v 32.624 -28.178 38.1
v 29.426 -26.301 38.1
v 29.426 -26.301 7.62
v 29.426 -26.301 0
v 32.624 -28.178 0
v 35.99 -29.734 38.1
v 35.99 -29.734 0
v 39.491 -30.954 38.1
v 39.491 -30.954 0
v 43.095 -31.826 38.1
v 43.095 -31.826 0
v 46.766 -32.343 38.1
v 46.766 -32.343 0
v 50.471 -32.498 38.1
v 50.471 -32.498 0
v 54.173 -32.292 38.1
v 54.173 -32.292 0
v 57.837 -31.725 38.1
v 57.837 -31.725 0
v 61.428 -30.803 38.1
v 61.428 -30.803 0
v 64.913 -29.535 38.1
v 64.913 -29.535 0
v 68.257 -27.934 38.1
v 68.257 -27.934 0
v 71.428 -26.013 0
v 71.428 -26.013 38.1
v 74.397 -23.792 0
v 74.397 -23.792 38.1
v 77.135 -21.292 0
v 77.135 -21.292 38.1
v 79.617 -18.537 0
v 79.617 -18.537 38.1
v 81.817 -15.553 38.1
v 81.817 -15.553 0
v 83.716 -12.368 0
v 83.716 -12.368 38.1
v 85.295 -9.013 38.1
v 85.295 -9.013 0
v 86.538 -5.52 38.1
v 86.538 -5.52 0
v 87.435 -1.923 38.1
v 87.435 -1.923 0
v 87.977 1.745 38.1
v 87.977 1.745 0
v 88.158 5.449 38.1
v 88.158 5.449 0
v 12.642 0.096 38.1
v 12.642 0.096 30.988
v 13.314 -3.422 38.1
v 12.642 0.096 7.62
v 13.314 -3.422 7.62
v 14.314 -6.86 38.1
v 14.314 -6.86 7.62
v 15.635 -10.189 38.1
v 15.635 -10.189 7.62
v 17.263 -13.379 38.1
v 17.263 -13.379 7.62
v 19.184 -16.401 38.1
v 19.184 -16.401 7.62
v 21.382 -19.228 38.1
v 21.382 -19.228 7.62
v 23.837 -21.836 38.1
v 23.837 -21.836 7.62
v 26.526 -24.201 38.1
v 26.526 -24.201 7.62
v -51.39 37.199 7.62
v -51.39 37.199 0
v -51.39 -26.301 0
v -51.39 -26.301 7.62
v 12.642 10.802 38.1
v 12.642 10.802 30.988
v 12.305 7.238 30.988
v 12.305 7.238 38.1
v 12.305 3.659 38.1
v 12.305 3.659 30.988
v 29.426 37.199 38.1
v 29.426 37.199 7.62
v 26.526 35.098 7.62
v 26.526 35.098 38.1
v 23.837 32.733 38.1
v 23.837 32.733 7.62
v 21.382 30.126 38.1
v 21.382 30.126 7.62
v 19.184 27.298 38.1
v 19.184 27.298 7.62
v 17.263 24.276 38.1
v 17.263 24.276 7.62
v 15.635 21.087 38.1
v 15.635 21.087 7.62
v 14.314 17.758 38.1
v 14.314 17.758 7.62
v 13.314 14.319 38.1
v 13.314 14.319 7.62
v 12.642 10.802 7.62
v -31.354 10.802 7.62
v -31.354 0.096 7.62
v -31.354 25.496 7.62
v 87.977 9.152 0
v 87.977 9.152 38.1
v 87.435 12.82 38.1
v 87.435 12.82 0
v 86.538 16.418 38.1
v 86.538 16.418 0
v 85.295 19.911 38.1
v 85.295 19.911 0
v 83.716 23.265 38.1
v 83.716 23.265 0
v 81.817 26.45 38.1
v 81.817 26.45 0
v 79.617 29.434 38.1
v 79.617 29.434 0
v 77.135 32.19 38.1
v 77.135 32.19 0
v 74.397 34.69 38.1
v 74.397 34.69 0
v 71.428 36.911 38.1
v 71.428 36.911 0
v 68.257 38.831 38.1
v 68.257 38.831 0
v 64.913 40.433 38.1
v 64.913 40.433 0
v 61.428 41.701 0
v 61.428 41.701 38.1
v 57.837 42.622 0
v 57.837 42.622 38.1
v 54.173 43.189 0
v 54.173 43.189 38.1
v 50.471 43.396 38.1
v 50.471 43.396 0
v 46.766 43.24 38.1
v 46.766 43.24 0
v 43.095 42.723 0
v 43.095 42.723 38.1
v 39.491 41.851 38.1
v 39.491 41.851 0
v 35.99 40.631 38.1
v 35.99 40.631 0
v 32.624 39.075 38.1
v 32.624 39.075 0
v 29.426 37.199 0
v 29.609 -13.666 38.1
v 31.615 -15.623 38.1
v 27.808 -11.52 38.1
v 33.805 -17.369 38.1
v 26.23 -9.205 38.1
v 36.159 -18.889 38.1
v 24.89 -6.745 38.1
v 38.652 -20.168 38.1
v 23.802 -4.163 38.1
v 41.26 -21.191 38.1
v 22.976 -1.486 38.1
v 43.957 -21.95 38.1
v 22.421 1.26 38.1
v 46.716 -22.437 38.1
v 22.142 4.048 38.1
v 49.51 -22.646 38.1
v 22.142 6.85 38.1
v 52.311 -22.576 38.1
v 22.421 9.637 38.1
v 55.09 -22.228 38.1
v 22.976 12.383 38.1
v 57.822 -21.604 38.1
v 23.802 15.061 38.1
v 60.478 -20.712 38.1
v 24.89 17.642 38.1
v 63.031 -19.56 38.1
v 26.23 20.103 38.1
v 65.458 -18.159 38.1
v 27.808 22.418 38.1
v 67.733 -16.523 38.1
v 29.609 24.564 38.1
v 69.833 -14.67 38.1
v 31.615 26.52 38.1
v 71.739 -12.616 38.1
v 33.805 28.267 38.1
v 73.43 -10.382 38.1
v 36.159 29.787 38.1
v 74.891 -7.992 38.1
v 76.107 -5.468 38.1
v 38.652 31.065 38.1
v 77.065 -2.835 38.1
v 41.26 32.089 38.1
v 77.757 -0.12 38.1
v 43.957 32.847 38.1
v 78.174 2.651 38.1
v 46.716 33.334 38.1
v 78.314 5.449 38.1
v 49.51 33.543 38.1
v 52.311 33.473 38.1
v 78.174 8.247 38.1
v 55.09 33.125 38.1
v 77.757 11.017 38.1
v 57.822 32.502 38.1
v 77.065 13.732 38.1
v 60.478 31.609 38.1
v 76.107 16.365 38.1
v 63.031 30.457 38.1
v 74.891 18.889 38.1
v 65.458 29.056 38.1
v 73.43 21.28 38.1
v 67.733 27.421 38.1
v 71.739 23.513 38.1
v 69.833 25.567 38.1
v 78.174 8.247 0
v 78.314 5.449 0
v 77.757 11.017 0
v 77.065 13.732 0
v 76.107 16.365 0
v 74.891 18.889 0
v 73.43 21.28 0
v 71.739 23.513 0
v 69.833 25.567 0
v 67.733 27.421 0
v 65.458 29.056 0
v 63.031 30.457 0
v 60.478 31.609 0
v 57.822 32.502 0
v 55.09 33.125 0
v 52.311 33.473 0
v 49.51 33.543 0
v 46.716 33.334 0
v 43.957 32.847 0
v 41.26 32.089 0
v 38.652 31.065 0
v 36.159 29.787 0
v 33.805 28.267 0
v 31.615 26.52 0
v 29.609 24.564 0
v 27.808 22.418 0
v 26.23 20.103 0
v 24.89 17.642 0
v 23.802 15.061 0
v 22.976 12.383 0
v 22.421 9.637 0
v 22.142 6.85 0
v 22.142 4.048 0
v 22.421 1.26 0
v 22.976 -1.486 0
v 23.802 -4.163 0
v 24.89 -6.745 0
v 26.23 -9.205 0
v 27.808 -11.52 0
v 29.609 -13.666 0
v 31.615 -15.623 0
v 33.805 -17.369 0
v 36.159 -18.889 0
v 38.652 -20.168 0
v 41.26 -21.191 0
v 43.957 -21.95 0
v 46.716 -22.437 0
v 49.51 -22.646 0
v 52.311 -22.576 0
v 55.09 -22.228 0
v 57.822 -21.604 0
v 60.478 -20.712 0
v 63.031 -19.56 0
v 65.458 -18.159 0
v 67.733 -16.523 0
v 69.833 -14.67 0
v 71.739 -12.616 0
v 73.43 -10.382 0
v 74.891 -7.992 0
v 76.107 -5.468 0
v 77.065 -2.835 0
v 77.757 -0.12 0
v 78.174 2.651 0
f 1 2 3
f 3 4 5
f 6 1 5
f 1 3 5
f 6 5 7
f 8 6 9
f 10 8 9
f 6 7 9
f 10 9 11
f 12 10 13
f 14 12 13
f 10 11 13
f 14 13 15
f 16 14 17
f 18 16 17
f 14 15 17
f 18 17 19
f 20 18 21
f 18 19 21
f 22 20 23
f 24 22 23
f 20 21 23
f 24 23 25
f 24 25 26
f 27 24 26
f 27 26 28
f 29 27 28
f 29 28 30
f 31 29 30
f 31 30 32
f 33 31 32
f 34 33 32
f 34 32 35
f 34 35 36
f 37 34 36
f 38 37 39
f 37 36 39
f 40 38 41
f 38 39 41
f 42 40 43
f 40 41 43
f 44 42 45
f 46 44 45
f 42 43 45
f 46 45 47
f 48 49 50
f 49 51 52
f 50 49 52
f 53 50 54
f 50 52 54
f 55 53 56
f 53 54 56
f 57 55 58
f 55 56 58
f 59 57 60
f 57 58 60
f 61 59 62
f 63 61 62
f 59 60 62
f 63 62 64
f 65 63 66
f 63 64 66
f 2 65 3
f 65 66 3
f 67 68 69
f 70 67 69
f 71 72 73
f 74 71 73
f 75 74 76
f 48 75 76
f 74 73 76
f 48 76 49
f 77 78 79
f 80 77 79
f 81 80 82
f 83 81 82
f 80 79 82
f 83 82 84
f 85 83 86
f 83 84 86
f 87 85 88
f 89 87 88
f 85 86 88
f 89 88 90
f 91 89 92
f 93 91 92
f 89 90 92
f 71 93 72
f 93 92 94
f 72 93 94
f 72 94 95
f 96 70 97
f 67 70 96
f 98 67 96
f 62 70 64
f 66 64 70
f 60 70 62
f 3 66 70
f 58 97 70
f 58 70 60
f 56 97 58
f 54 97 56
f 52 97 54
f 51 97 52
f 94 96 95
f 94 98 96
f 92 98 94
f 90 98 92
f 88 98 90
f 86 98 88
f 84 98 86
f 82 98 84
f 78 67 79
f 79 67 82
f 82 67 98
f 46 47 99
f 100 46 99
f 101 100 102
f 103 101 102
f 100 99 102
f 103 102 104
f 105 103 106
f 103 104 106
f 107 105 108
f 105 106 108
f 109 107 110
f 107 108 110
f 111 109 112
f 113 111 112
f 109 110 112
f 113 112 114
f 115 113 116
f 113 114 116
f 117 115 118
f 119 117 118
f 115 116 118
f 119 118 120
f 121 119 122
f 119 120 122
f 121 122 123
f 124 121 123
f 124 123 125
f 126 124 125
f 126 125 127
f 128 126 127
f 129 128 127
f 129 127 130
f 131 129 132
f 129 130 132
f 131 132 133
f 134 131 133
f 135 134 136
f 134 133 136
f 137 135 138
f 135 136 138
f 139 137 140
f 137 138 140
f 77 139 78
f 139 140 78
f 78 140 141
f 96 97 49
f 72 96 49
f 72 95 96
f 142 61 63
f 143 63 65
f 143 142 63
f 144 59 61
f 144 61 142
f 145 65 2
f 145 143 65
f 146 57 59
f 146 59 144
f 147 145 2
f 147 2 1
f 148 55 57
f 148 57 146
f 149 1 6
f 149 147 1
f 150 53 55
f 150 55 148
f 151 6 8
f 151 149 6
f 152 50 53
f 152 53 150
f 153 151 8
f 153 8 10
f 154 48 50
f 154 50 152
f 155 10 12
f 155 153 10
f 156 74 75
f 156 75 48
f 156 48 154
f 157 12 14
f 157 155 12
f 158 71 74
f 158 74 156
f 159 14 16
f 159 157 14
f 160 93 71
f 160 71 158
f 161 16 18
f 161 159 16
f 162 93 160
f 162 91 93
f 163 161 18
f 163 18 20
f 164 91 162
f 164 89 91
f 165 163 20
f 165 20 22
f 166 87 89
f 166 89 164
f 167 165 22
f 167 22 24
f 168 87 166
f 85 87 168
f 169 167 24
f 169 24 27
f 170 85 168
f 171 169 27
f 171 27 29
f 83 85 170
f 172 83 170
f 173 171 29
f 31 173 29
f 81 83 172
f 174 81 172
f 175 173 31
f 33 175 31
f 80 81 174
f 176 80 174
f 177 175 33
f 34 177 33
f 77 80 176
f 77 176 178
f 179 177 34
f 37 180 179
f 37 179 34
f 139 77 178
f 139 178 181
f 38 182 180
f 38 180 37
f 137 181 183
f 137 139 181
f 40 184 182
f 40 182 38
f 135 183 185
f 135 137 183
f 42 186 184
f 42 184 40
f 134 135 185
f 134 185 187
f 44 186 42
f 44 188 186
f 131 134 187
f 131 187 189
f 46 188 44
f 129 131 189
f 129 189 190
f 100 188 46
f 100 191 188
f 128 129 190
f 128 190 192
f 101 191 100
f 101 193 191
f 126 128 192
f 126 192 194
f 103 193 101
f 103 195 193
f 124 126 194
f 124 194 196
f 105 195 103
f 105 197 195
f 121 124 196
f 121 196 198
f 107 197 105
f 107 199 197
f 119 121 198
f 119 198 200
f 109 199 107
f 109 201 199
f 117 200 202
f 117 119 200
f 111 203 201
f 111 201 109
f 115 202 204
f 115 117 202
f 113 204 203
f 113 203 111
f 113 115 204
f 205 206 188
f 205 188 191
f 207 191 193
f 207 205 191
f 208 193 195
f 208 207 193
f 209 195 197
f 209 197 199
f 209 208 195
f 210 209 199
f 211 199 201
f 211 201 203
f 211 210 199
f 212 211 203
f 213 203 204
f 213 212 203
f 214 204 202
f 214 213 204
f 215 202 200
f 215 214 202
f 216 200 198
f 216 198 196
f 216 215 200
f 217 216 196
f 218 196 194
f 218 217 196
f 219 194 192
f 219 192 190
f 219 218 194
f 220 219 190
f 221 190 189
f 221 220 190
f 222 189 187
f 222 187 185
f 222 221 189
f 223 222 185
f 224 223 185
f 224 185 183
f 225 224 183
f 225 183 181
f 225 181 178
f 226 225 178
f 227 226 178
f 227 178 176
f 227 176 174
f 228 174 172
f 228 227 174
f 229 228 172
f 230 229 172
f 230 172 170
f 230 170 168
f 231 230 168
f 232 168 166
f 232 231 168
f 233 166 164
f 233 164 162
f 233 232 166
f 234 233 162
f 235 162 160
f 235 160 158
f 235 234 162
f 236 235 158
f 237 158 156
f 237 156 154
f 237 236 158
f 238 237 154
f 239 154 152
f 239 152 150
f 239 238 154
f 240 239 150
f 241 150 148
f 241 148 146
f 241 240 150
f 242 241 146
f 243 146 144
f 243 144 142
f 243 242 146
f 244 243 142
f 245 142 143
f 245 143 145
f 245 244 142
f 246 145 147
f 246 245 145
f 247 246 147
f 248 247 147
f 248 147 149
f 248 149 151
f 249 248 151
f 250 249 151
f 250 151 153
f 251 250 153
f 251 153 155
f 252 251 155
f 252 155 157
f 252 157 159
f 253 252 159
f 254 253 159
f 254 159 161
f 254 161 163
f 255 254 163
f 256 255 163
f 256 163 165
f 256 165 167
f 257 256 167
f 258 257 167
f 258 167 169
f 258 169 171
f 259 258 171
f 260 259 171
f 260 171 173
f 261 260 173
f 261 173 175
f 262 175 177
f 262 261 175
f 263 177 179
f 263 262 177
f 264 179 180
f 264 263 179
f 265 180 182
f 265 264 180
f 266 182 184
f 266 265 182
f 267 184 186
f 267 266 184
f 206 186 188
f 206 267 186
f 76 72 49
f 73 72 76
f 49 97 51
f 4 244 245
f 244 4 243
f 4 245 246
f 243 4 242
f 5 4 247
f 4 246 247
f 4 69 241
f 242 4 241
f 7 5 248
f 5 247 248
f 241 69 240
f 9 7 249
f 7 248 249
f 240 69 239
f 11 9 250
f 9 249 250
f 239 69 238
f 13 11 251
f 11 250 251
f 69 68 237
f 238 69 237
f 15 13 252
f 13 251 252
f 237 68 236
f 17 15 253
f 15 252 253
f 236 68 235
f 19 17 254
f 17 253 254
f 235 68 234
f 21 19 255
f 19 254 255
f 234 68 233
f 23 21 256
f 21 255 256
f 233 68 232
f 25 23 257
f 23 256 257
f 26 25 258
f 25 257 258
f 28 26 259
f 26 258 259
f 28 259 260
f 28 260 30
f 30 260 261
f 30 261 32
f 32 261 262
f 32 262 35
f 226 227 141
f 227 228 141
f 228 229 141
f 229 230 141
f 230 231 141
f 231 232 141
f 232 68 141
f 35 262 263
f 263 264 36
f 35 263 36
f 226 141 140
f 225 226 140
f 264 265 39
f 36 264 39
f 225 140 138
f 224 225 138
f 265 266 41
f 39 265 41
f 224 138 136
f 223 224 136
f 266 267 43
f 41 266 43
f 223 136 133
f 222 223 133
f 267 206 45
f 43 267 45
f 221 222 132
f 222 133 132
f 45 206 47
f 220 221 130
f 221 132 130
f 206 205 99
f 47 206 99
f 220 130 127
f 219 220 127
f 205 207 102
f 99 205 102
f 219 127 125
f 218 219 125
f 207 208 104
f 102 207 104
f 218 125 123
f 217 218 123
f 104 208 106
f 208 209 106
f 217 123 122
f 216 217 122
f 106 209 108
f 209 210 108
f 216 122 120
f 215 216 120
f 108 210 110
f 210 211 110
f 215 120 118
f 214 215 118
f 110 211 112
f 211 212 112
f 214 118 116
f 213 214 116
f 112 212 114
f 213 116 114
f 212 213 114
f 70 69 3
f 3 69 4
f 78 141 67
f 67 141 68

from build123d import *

# Parameters (mm, degrees)
F0_R     = 28.103341
F1_DEPTH = 38.1
F2_DEPTH = 7.62
F3_DEPTH = 30.988
F5_DEPTH = 25.4


with BuildPart() as f1:
    # F0 (on Top) → F1 (new body)
    with BuildSketch(Plane.XY):
        with BuildLine():
            ThreePointArc((88.158266, 5.448709), (68.256571, 38.830986), (29.426306, 37.198709))
            ThreePointArc((29.426306, 37.198709), (18.187712, 25.81016), (12.641991, 10.801828))
            ThreePointArc((12.641991, 10.801828), (12.262525, 5.448709), (12.641991, 0.09559))
            ThreePointArc((12.641991, 0.09559), (18.187712, -14.912741), (29.426306, -26.301291))
            ThreePointArc((29.426306, -26.301291), (68.256571, -27.933568), (88.158266, 5.448709))
        make_face()
        with Locations((50.210395, 5.448709)):
            Circle(F0_R, mode=Mode.SUBTRACT)
    extrude(amount=F1_DEPTH)

    # F0 (on Top) → F2 (join)
    with BuildSketch(Plane.XY):
        with BuildLine():
            Line((29.426306, 37.198709), (-51.389605, 37.198709))
            Line((-51.389605, 37.198709), (-51.389605, -26.301291))
            Line((-51.389605, -26.301291), (29.426306, -26.301291))
            ThreePointArc((29.426306, -26.301291), (18.187712, -14.912741), (12.641991, 0.09559))
            Line((12.641991, 0.09559), (-31.35398, 0.09559))
            Line((-31.35398, 0.09559), (-31.35398, 10.801828))
            Line((-31.35398, 10.801828), (12.641991, 10.801828))
            ThreePointArc((12.641991, 10.801828), (18.187712, 25.81016), (29.426306, 37.198709))
        make_face()
    extrude(amount=F2_DEPTH)

    # F0 (on Top) → F3 (join)
    with BuildSketch(Plane.XY):
        with BuildLine():
            ThreePointArc((12.641991, 0.09559), (12.262525, 5.448709), (12.641991, 10.801828))
            Line((12.641991, 10.801828), (-31.35398, 10.801828))
            Line((-31.35398, 10.801828), (-31.35398, 0.09559))
            Line((-31.35398, 0.09559), (12.641991, 0.09559))
        make_face()
    extrude(amount=F3_DEPTH)

    # F4 (on face) → F5 (cut)
    with BuildSketch(Plane.XZ.offset(-0.09559)):
        Polygon((-31.35398, 7.62), (12.641991, 30.988), (-31.35398, 30.988), align=None)
    extrude(amount=-F5_DEPTH, mode=Mode.SUBTRACT)


solid = f1.part
